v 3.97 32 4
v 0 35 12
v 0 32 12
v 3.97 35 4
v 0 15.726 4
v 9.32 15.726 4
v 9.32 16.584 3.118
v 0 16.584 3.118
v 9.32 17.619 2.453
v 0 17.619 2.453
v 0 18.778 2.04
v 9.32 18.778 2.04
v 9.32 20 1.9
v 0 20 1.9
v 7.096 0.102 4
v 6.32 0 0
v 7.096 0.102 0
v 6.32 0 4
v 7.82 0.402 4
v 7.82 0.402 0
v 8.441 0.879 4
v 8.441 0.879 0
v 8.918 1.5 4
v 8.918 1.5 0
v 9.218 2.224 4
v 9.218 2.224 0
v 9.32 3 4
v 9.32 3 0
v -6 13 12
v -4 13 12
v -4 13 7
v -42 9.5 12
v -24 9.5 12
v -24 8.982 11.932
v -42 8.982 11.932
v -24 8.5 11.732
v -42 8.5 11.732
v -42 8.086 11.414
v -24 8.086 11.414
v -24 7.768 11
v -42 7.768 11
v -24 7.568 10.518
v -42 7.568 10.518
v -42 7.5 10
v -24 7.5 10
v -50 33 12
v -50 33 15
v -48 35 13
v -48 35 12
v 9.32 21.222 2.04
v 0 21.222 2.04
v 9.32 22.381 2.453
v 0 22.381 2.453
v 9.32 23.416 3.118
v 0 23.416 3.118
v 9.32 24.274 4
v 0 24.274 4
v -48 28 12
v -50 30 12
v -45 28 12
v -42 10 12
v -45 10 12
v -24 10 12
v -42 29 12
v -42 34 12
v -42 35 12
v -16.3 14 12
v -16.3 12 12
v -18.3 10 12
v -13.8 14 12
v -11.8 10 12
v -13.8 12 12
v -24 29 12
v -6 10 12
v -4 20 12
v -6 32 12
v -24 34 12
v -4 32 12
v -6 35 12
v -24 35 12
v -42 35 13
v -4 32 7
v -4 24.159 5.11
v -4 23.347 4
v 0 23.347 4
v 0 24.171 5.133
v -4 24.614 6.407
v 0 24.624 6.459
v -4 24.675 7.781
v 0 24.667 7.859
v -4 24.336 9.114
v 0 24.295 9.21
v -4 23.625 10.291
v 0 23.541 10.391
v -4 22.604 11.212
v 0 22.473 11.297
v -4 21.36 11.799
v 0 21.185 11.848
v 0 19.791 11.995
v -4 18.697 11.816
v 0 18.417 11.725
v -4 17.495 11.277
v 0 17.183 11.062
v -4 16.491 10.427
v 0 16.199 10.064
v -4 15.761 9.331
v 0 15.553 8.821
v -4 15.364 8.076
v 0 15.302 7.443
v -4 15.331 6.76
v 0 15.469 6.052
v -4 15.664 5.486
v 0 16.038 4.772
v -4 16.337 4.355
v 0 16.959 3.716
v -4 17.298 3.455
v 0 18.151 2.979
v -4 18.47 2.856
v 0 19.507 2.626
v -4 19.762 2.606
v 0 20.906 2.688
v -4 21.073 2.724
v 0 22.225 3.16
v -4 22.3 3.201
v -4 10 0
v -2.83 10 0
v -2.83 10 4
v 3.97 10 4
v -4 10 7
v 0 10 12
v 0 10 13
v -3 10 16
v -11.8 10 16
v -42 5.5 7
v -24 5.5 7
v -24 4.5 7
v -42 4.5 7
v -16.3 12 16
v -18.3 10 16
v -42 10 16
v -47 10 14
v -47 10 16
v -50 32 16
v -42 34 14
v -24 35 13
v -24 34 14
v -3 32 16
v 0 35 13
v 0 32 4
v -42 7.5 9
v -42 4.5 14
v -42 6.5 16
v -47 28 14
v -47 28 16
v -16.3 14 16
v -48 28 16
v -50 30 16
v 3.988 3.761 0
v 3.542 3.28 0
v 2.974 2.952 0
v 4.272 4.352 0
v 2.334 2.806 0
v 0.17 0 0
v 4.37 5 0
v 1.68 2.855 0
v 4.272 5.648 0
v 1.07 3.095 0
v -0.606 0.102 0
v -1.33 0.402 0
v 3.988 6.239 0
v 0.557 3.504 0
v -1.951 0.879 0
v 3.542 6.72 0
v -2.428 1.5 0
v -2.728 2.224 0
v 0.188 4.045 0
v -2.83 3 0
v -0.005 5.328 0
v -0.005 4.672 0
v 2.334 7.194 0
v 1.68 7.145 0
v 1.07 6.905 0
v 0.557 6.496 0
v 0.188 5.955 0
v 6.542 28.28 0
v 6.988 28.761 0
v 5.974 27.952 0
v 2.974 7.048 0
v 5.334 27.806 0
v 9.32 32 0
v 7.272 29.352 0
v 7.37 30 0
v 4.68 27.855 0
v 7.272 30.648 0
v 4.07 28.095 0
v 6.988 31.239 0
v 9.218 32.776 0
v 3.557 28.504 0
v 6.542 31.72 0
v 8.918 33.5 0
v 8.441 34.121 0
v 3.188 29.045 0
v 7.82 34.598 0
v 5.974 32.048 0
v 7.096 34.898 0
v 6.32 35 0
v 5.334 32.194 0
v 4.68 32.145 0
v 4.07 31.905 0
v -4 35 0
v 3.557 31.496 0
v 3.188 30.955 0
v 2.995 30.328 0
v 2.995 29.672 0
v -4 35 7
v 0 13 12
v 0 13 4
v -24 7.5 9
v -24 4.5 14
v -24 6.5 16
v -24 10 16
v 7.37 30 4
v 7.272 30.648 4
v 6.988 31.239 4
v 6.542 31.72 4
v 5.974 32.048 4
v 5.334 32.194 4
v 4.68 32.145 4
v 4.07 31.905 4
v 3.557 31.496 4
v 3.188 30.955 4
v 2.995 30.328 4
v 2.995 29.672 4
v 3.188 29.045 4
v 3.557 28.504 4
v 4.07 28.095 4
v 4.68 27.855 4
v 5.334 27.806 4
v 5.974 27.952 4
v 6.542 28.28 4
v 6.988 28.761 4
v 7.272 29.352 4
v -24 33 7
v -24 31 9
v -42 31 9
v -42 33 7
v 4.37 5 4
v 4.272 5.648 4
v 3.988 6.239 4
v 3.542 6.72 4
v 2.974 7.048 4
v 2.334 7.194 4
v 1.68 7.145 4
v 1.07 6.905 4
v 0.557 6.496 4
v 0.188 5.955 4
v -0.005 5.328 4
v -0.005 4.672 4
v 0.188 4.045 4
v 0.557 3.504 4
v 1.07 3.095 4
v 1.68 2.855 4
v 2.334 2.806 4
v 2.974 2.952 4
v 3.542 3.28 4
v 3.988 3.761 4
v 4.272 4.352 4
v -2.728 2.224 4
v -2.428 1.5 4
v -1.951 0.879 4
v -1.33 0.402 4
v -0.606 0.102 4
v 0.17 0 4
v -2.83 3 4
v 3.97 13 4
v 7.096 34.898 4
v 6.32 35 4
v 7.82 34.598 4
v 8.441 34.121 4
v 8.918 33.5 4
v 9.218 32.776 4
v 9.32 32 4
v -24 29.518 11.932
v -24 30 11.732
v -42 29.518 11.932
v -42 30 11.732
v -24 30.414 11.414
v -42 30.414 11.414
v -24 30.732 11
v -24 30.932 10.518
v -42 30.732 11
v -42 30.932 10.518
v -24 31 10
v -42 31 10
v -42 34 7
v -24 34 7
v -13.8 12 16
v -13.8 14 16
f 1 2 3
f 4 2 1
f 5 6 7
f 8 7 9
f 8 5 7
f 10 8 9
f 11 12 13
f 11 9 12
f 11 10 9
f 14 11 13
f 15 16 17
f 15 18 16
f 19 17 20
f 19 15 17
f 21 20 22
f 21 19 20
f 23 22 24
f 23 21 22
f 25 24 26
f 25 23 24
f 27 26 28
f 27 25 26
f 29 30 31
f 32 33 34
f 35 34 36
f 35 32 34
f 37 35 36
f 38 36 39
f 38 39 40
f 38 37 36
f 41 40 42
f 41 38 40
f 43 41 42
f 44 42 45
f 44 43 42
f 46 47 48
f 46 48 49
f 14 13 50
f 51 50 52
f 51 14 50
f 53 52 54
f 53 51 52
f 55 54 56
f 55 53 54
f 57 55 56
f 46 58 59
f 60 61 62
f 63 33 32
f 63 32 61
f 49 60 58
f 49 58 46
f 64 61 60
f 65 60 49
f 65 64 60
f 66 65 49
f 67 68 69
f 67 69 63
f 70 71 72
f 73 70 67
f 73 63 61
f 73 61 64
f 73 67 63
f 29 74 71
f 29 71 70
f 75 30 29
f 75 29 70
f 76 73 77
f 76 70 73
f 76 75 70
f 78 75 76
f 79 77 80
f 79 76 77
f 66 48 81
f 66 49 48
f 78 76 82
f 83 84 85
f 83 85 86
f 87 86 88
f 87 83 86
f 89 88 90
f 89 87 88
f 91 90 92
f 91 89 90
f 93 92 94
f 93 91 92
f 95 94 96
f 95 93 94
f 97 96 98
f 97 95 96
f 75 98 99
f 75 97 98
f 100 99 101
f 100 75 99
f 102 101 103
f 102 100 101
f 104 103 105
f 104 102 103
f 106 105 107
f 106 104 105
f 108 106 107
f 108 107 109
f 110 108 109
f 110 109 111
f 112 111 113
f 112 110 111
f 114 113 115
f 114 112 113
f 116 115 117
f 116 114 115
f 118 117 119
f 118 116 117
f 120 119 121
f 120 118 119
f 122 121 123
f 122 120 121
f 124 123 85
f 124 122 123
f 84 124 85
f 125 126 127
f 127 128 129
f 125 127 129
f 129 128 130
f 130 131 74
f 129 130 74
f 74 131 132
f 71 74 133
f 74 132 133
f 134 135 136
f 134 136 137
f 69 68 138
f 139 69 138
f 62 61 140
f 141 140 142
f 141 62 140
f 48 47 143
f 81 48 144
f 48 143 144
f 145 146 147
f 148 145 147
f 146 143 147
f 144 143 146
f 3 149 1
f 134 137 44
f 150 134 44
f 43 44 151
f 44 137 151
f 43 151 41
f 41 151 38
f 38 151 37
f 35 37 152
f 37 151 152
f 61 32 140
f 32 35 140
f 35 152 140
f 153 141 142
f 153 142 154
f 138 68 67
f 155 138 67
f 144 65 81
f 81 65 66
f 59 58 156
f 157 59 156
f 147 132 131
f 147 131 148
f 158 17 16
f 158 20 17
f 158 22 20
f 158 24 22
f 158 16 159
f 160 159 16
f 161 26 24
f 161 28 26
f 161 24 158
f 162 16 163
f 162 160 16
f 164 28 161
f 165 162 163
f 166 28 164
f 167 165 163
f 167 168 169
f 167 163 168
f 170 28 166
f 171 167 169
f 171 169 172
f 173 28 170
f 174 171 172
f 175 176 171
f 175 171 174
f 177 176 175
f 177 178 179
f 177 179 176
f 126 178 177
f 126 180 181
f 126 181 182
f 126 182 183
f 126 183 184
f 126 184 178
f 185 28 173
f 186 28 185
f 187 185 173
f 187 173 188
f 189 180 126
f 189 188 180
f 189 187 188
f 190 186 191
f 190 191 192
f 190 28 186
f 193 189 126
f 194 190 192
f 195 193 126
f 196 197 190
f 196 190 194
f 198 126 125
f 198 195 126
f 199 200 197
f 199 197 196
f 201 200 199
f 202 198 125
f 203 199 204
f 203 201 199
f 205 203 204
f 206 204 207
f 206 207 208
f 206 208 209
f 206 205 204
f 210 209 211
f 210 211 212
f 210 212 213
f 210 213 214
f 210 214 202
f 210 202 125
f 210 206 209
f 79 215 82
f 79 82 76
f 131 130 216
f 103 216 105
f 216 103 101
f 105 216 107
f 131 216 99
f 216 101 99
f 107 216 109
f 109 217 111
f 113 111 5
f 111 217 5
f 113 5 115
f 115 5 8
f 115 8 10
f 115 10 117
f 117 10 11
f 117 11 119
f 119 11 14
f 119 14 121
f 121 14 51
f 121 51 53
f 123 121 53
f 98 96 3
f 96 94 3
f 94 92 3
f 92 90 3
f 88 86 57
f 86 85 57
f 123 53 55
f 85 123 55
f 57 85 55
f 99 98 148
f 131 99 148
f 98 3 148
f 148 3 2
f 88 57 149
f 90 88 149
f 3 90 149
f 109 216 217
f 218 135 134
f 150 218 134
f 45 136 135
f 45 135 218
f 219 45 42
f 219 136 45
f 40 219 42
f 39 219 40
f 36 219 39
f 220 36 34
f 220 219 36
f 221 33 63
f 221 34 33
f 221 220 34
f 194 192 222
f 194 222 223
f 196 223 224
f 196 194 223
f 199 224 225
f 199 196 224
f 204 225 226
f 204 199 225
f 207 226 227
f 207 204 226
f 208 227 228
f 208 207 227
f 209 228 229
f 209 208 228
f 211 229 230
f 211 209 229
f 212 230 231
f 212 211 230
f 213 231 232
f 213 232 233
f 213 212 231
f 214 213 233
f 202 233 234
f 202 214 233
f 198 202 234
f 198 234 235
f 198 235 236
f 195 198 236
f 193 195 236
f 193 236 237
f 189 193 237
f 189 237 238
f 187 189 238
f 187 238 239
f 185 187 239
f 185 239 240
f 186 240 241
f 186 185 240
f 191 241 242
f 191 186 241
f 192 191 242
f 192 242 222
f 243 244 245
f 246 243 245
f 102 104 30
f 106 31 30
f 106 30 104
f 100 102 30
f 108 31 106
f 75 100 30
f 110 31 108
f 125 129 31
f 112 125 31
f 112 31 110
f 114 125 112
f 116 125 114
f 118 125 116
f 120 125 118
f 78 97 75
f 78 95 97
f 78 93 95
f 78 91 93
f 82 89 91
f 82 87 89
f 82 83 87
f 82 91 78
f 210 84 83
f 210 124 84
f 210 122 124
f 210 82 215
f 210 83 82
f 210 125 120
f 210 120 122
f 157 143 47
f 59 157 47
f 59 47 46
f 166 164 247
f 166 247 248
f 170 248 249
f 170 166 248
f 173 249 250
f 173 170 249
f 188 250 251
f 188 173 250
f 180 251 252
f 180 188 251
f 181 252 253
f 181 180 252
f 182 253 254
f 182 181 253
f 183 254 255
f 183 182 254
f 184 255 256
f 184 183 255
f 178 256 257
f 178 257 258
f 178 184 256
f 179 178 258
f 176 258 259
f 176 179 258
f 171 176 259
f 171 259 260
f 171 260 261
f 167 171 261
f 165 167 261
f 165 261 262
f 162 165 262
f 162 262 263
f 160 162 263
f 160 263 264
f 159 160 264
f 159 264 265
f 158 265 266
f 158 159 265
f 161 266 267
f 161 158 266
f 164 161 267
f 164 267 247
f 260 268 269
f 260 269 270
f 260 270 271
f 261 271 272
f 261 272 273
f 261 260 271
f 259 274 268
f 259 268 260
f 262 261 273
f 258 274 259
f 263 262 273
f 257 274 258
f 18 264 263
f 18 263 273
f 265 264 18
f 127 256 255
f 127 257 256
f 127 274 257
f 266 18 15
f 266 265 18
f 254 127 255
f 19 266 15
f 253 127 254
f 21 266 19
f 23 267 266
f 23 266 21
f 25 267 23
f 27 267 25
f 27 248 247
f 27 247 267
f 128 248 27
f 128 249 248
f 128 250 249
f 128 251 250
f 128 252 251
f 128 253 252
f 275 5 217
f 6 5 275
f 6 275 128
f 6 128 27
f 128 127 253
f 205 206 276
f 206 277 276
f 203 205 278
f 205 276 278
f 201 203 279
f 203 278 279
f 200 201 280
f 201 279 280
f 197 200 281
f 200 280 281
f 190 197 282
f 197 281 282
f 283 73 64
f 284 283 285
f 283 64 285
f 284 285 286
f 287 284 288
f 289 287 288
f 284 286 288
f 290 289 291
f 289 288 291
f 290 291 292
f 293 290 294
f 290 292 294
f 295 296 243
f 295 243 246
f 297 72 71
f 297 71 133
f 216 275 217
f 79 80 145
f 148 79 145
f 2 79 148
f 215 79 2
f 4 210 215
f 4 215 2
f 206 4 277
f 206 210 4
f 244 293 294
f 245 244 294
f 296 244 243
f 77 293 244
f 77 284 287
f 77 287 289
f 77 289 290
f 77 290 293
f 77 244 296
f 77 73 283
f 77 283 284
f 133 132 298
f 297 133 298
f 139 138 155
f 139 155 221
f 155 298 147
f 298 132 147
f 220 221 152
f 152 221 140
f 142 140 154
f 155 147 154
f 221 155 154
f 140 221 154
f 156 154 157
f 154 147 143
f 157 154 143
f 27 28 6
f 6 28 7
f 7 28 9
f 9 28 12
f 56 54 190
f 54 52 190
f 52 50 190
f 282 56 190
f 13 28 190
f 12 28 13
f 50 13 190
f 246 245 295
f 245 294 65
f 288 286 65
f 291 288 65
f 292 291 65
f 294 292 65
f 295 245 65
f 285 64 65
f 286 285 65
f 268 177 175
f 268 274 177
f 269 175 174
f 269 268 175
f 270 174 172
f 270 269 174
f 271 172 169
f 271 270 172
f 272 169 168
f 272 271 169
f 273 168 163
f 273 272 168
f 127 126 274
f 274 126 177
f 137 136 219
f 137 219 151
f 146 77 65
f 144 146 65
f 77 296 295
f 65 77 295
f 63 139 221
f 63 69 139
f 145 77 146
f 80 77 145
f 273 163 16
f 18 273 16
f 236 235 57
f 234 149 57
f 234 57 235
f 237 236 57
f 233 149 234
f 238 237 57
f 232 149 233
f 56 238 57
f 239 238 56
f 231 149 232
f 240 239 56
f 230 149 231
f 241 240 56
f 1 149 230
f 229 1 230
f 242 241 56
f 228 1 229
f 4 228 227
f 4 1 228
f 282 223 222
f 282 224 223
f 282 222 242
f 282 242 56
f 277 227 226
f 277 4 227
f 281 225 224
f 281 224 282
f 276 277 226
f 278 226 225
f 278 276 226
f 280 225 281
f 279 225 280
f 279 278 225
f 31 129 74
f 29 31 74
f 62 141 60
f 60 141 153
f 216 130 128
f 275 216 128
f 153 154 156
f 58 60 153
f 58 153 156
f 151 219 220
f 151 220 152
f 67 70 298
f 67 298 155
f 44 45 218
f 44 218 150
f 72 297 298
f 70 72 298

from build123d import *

# Parameters (mm, degrees)
SKETCH_1_R               = 2.2
EXTRUDE_2_DEPTH          = 4
SKETCH_2_W               = 4
SKETCH_2_H               = 25
EXTRUDE_3_DEPTH          = 16
SKETCH_3_W               = 4
SKETCH_3_H               = 25
EXTRUDE_4_DEPTH          = 50
SKETCH_4_W               = 18
SKETCH_4_H               = 6.5
EXTRUDE_5_DEPTH          = 4
SKETCH_5_W               = 18
SKETCH_5_H               = 4
EXTRUDE_6_DEPTH          = 5
SKETCH_6_W               = 2.5
SKETCH_6_H               = 4
SKETCH_6_W_2             = 3
SKETCH_6_H_2             = 18
CUT_EXTRUDE_1_DEPTH      = 4
CUT_EXTRUDE_2_DEPTH      = 64.095166217
CUT_EXTRUDE_2_DEPTH_BACK = 64.095166217
SKETCH_7_R               = 4.7
CUT_EXTRUDE_3_DEPTH      = 64.095166217
EXTRUDE_7_DEPTH          = 3
EXTRUDE_8_DEPTH          = 3
CHAMFER_1_SIZE           = 3
CHAMFER_2_SIZE           = 2
FILLET_1_R               = 3
SKETCH_11_W              = 18
SKETCH_11_H              = 1
CUT_EXTRUDE_4_DEPTH      = 10
FILLET_2_R               = 2


with BuildPart() as part:
    # 草图1 → 凸台-拉伸2 (new body)
    with BuildSketch(Plane.XY):
        Polygon((0, 35), (0, 10), (-2.83, 10), (-2.83, 0), (9.32, 0), (9.32, 35), align=None)
        with Locations((2.17, 5)):
            Circle(SKETCH_1_R, mode=Mode.SUBTRACT)
        with Locations((5.17, 30)):
            Circle(SKETCH_1_R, mode=Mode.SUBTRACT)
    extrude(amount=EXTRUDE_2_DEPTH)

    # 草图2 → 凸台-拉伸3 (add)
    with BuildSketch(Plane(origin=(0, 0, 0), x_dir=(-1, 0, 0), z_dir=(0, 0, -1))):
        with Locations((2, 22.5)):
            Rectangle(SKETCH_2_W, SKETCH_2_H)
    extrude(amount=-EXTRUDE_3_DEPTH)

    # 草图3 → 凸台-拉伸4 (add)
    with BuildSketch(Plane(origin=(0, 0, 0), x_dir=(0, 0, -1), z_dir=(1, 0, 0))):
        with Locations((-14, 22.5)):
            Rectangle(SKETCH_3_W, SKETCH_3_H)
    extrude(amount=-EXTRUDE_4_DEPTH)

    # 草图4 → 凸台-拉伸5 (add)
    with BuildSketch(Plane(origin=(0, 0, 12), x_dir=(-1, 0, 0), z_dir=(0, 0, -1))):
        with Locations((33, 6.75)):
            Rectangle(SKETCH_4_W, SKETCH_4_H)
    extrude(amount=-EXTRUDE_5_DEPTH)

    # 草图5 → 凸台-拉伸6 (add)
    with BuildSketch(Plane(origin=(0, 0, 12), x_dir=(-1, 0, 0), z_dir=(0, 0, -1))):
        with Locations((33, 5.5)):
            Rectangle(SKETCH_5_W, SKETCH_5_H)
        with Locations((33, 33)):
            Rectangle(SKETCH_5_W, SKETCH_5_H)
    extrude(amount=EXTRUDE_6_DEPTH)

    # 草图6 → 切除-拉伸1 (cut)
    with BuildSketch(Plane(origin=(0, 0, 12), x_dir=(-1, 0, 0), z_dir=(0, 0, -1))):
        with Locations((15.05, 12)):
            Rectangle(SKETCH_6_W, SKETCH_6_H)
        with Locations((48.5, 19)):
            Rectangle(SKETCH_6_W_2, SKETCH_6_H_2)
    extrude(amount=-CUT_EXTRUDE_1_DEPTH, mode=Mode.SUBTRACT)

    # 草图7 → 切除-拉伸2 (cut, two sides: drawn at the far end of the back side and taken through both)
    with BuildSketch(Plane(origin=(0, 0, 0), x_dir=(0, 0, -1), z_dir=(1, 0, 0)).offset(-CUT_EXTRUDE_2_DEPTH_BACK)):
        with Locations(Location((-7.3, 20, 0), (0, 0, 45.402043339))):
            Circle(SKETCH_7_R)
    extrude(amount=CUT_EXTRUDE_2_DEPTH + CUT_EXTRUDE_2_DEPTH_BACK, mode=Mode.SUBTRACT)

    # 草图8 → 切除-拉伸3 (cut, through all)
    with BuildSketch(Plane(origin=(0, 0, 0), x_dir=(0, 0, -1), z_dir=(1, 0, 0))):
        with BuildLine():
            Line((-4, 24.274342055), (-4, 23.346640106))
            ThreePointArc((-4, 23.346640106), (-12, 20), (-4, 16.653359894))
            Line((-4, 16.653359894), (-4, 15.725657945))
            ThreePointArc((-4, 15.725657945), (-2.453351674, 17.61882382), (-1.9, 20))
            ThreePointArc((-1.9, 20), (-2.453351674, 22.38117618), (-4, 24.274342055))
        make_face()
        with BuildLine():
            ThreePointArc((-4, 16.653359894), (-12, 20), (-4, 23.346640106))
            Line((-4, 23.346640106), (-4, 24.274342055))
            ThreePointArc((-4, 24.274342055), (-12.7, 20), (-4, 15.725657945))
            Line((-4, 15.725657945), (-4, 16.653359894))
        make_face()
    extrude(amount=CUT_EXTRUDE_3_DEPTH, mode=Mode.SUBTRACT)

    # 草图9 → 凸台-拉伸7 (add)
    with BuildSketch(Plane.XZ.offset(-10)):
        Polygon((3.97, 4), (-0.03, 4), (0, 12), align=None)
        Polygon((-6, 12), (-4, 12), (-4, 7), align=None)
    extrude(amount=-EXTRUDE_7_DEPTH)

    # 草图10 → 凸台-拉伸8 (add)
    with BuildSketch(Plane(origin=(0, 35, 0), x_dir=(1, 0, 0), z_dir=(0, 1, 0))):
        Polygon((3.97, -4), (0, -4), (0, -12), align=None)
        Polygon((-4, -7), (-6, -12), (-4, -12), align=None)
    extrude(amount=-EXTRUDE_8_DEPTH)

    # 倒角1
    chamfer_1_edges = [part.edges().sort_by_distance(p)[0] for p in [
        (0, 22.5, 16),
        (-25, 35, 16),
        (-33, 3.5, 16),
    ]]
    chamfer(chamfer_1_edges, length=CHAMFER_1_SIZE)

    # 倒角2
    chamfer_2_edges = [part.edges().sort_by_distance(p)[0] for p in [
        (-13.8, 10, 14),
        (-16.3, 10, 14),
        (-50, 28, 14),
        (-47, 19, 12),
        (-50, 35, 12.5),
        (-33, 7.5, 7),
        (-33, 31, 7),
    ]]
    chamfer(chamfer_2_edges, length=CHAMFER_2_SIZE)

    # 圆角1
    fillet_1_edges = [part.edges().sort_by_distance(p)[0] for p in [
        (9.32, 35, 2),
        (9.32, 0, 2),
        (-2.83, 0, 2),
    ]]
    fillet(fillet_1_edges, radius=FILLET_1_R)

    # 草图11 → 切除-拉伸4 (cut)
    with BuildSketch(Plane(origin=(0, 0, 7), x_dir=(-1, 0, 0), z_dir=(0, 0, -1))):
        with Locations((33, 34.5)):
            Rectangle(SKETCH_11_W, SKETCH_11_H)
        with Locations((33, 4)):
            Rectangle(SKETCH_11_W, SKETCH_11_H)
    extrude(amount=-CUT_EXTRUDE_4_DEPTH, mode=Mode.SUBTRACT)

    # 圆角2
    fillet_2_edges = [part.edges().sort_by_distance(p)[0] for p in [
        (-33, 7.5, 12),
        (-33, 31, 12),
    ]]
    fillet(fillet_2_edges, radius=FILLET_2_R)


solid = part.part
